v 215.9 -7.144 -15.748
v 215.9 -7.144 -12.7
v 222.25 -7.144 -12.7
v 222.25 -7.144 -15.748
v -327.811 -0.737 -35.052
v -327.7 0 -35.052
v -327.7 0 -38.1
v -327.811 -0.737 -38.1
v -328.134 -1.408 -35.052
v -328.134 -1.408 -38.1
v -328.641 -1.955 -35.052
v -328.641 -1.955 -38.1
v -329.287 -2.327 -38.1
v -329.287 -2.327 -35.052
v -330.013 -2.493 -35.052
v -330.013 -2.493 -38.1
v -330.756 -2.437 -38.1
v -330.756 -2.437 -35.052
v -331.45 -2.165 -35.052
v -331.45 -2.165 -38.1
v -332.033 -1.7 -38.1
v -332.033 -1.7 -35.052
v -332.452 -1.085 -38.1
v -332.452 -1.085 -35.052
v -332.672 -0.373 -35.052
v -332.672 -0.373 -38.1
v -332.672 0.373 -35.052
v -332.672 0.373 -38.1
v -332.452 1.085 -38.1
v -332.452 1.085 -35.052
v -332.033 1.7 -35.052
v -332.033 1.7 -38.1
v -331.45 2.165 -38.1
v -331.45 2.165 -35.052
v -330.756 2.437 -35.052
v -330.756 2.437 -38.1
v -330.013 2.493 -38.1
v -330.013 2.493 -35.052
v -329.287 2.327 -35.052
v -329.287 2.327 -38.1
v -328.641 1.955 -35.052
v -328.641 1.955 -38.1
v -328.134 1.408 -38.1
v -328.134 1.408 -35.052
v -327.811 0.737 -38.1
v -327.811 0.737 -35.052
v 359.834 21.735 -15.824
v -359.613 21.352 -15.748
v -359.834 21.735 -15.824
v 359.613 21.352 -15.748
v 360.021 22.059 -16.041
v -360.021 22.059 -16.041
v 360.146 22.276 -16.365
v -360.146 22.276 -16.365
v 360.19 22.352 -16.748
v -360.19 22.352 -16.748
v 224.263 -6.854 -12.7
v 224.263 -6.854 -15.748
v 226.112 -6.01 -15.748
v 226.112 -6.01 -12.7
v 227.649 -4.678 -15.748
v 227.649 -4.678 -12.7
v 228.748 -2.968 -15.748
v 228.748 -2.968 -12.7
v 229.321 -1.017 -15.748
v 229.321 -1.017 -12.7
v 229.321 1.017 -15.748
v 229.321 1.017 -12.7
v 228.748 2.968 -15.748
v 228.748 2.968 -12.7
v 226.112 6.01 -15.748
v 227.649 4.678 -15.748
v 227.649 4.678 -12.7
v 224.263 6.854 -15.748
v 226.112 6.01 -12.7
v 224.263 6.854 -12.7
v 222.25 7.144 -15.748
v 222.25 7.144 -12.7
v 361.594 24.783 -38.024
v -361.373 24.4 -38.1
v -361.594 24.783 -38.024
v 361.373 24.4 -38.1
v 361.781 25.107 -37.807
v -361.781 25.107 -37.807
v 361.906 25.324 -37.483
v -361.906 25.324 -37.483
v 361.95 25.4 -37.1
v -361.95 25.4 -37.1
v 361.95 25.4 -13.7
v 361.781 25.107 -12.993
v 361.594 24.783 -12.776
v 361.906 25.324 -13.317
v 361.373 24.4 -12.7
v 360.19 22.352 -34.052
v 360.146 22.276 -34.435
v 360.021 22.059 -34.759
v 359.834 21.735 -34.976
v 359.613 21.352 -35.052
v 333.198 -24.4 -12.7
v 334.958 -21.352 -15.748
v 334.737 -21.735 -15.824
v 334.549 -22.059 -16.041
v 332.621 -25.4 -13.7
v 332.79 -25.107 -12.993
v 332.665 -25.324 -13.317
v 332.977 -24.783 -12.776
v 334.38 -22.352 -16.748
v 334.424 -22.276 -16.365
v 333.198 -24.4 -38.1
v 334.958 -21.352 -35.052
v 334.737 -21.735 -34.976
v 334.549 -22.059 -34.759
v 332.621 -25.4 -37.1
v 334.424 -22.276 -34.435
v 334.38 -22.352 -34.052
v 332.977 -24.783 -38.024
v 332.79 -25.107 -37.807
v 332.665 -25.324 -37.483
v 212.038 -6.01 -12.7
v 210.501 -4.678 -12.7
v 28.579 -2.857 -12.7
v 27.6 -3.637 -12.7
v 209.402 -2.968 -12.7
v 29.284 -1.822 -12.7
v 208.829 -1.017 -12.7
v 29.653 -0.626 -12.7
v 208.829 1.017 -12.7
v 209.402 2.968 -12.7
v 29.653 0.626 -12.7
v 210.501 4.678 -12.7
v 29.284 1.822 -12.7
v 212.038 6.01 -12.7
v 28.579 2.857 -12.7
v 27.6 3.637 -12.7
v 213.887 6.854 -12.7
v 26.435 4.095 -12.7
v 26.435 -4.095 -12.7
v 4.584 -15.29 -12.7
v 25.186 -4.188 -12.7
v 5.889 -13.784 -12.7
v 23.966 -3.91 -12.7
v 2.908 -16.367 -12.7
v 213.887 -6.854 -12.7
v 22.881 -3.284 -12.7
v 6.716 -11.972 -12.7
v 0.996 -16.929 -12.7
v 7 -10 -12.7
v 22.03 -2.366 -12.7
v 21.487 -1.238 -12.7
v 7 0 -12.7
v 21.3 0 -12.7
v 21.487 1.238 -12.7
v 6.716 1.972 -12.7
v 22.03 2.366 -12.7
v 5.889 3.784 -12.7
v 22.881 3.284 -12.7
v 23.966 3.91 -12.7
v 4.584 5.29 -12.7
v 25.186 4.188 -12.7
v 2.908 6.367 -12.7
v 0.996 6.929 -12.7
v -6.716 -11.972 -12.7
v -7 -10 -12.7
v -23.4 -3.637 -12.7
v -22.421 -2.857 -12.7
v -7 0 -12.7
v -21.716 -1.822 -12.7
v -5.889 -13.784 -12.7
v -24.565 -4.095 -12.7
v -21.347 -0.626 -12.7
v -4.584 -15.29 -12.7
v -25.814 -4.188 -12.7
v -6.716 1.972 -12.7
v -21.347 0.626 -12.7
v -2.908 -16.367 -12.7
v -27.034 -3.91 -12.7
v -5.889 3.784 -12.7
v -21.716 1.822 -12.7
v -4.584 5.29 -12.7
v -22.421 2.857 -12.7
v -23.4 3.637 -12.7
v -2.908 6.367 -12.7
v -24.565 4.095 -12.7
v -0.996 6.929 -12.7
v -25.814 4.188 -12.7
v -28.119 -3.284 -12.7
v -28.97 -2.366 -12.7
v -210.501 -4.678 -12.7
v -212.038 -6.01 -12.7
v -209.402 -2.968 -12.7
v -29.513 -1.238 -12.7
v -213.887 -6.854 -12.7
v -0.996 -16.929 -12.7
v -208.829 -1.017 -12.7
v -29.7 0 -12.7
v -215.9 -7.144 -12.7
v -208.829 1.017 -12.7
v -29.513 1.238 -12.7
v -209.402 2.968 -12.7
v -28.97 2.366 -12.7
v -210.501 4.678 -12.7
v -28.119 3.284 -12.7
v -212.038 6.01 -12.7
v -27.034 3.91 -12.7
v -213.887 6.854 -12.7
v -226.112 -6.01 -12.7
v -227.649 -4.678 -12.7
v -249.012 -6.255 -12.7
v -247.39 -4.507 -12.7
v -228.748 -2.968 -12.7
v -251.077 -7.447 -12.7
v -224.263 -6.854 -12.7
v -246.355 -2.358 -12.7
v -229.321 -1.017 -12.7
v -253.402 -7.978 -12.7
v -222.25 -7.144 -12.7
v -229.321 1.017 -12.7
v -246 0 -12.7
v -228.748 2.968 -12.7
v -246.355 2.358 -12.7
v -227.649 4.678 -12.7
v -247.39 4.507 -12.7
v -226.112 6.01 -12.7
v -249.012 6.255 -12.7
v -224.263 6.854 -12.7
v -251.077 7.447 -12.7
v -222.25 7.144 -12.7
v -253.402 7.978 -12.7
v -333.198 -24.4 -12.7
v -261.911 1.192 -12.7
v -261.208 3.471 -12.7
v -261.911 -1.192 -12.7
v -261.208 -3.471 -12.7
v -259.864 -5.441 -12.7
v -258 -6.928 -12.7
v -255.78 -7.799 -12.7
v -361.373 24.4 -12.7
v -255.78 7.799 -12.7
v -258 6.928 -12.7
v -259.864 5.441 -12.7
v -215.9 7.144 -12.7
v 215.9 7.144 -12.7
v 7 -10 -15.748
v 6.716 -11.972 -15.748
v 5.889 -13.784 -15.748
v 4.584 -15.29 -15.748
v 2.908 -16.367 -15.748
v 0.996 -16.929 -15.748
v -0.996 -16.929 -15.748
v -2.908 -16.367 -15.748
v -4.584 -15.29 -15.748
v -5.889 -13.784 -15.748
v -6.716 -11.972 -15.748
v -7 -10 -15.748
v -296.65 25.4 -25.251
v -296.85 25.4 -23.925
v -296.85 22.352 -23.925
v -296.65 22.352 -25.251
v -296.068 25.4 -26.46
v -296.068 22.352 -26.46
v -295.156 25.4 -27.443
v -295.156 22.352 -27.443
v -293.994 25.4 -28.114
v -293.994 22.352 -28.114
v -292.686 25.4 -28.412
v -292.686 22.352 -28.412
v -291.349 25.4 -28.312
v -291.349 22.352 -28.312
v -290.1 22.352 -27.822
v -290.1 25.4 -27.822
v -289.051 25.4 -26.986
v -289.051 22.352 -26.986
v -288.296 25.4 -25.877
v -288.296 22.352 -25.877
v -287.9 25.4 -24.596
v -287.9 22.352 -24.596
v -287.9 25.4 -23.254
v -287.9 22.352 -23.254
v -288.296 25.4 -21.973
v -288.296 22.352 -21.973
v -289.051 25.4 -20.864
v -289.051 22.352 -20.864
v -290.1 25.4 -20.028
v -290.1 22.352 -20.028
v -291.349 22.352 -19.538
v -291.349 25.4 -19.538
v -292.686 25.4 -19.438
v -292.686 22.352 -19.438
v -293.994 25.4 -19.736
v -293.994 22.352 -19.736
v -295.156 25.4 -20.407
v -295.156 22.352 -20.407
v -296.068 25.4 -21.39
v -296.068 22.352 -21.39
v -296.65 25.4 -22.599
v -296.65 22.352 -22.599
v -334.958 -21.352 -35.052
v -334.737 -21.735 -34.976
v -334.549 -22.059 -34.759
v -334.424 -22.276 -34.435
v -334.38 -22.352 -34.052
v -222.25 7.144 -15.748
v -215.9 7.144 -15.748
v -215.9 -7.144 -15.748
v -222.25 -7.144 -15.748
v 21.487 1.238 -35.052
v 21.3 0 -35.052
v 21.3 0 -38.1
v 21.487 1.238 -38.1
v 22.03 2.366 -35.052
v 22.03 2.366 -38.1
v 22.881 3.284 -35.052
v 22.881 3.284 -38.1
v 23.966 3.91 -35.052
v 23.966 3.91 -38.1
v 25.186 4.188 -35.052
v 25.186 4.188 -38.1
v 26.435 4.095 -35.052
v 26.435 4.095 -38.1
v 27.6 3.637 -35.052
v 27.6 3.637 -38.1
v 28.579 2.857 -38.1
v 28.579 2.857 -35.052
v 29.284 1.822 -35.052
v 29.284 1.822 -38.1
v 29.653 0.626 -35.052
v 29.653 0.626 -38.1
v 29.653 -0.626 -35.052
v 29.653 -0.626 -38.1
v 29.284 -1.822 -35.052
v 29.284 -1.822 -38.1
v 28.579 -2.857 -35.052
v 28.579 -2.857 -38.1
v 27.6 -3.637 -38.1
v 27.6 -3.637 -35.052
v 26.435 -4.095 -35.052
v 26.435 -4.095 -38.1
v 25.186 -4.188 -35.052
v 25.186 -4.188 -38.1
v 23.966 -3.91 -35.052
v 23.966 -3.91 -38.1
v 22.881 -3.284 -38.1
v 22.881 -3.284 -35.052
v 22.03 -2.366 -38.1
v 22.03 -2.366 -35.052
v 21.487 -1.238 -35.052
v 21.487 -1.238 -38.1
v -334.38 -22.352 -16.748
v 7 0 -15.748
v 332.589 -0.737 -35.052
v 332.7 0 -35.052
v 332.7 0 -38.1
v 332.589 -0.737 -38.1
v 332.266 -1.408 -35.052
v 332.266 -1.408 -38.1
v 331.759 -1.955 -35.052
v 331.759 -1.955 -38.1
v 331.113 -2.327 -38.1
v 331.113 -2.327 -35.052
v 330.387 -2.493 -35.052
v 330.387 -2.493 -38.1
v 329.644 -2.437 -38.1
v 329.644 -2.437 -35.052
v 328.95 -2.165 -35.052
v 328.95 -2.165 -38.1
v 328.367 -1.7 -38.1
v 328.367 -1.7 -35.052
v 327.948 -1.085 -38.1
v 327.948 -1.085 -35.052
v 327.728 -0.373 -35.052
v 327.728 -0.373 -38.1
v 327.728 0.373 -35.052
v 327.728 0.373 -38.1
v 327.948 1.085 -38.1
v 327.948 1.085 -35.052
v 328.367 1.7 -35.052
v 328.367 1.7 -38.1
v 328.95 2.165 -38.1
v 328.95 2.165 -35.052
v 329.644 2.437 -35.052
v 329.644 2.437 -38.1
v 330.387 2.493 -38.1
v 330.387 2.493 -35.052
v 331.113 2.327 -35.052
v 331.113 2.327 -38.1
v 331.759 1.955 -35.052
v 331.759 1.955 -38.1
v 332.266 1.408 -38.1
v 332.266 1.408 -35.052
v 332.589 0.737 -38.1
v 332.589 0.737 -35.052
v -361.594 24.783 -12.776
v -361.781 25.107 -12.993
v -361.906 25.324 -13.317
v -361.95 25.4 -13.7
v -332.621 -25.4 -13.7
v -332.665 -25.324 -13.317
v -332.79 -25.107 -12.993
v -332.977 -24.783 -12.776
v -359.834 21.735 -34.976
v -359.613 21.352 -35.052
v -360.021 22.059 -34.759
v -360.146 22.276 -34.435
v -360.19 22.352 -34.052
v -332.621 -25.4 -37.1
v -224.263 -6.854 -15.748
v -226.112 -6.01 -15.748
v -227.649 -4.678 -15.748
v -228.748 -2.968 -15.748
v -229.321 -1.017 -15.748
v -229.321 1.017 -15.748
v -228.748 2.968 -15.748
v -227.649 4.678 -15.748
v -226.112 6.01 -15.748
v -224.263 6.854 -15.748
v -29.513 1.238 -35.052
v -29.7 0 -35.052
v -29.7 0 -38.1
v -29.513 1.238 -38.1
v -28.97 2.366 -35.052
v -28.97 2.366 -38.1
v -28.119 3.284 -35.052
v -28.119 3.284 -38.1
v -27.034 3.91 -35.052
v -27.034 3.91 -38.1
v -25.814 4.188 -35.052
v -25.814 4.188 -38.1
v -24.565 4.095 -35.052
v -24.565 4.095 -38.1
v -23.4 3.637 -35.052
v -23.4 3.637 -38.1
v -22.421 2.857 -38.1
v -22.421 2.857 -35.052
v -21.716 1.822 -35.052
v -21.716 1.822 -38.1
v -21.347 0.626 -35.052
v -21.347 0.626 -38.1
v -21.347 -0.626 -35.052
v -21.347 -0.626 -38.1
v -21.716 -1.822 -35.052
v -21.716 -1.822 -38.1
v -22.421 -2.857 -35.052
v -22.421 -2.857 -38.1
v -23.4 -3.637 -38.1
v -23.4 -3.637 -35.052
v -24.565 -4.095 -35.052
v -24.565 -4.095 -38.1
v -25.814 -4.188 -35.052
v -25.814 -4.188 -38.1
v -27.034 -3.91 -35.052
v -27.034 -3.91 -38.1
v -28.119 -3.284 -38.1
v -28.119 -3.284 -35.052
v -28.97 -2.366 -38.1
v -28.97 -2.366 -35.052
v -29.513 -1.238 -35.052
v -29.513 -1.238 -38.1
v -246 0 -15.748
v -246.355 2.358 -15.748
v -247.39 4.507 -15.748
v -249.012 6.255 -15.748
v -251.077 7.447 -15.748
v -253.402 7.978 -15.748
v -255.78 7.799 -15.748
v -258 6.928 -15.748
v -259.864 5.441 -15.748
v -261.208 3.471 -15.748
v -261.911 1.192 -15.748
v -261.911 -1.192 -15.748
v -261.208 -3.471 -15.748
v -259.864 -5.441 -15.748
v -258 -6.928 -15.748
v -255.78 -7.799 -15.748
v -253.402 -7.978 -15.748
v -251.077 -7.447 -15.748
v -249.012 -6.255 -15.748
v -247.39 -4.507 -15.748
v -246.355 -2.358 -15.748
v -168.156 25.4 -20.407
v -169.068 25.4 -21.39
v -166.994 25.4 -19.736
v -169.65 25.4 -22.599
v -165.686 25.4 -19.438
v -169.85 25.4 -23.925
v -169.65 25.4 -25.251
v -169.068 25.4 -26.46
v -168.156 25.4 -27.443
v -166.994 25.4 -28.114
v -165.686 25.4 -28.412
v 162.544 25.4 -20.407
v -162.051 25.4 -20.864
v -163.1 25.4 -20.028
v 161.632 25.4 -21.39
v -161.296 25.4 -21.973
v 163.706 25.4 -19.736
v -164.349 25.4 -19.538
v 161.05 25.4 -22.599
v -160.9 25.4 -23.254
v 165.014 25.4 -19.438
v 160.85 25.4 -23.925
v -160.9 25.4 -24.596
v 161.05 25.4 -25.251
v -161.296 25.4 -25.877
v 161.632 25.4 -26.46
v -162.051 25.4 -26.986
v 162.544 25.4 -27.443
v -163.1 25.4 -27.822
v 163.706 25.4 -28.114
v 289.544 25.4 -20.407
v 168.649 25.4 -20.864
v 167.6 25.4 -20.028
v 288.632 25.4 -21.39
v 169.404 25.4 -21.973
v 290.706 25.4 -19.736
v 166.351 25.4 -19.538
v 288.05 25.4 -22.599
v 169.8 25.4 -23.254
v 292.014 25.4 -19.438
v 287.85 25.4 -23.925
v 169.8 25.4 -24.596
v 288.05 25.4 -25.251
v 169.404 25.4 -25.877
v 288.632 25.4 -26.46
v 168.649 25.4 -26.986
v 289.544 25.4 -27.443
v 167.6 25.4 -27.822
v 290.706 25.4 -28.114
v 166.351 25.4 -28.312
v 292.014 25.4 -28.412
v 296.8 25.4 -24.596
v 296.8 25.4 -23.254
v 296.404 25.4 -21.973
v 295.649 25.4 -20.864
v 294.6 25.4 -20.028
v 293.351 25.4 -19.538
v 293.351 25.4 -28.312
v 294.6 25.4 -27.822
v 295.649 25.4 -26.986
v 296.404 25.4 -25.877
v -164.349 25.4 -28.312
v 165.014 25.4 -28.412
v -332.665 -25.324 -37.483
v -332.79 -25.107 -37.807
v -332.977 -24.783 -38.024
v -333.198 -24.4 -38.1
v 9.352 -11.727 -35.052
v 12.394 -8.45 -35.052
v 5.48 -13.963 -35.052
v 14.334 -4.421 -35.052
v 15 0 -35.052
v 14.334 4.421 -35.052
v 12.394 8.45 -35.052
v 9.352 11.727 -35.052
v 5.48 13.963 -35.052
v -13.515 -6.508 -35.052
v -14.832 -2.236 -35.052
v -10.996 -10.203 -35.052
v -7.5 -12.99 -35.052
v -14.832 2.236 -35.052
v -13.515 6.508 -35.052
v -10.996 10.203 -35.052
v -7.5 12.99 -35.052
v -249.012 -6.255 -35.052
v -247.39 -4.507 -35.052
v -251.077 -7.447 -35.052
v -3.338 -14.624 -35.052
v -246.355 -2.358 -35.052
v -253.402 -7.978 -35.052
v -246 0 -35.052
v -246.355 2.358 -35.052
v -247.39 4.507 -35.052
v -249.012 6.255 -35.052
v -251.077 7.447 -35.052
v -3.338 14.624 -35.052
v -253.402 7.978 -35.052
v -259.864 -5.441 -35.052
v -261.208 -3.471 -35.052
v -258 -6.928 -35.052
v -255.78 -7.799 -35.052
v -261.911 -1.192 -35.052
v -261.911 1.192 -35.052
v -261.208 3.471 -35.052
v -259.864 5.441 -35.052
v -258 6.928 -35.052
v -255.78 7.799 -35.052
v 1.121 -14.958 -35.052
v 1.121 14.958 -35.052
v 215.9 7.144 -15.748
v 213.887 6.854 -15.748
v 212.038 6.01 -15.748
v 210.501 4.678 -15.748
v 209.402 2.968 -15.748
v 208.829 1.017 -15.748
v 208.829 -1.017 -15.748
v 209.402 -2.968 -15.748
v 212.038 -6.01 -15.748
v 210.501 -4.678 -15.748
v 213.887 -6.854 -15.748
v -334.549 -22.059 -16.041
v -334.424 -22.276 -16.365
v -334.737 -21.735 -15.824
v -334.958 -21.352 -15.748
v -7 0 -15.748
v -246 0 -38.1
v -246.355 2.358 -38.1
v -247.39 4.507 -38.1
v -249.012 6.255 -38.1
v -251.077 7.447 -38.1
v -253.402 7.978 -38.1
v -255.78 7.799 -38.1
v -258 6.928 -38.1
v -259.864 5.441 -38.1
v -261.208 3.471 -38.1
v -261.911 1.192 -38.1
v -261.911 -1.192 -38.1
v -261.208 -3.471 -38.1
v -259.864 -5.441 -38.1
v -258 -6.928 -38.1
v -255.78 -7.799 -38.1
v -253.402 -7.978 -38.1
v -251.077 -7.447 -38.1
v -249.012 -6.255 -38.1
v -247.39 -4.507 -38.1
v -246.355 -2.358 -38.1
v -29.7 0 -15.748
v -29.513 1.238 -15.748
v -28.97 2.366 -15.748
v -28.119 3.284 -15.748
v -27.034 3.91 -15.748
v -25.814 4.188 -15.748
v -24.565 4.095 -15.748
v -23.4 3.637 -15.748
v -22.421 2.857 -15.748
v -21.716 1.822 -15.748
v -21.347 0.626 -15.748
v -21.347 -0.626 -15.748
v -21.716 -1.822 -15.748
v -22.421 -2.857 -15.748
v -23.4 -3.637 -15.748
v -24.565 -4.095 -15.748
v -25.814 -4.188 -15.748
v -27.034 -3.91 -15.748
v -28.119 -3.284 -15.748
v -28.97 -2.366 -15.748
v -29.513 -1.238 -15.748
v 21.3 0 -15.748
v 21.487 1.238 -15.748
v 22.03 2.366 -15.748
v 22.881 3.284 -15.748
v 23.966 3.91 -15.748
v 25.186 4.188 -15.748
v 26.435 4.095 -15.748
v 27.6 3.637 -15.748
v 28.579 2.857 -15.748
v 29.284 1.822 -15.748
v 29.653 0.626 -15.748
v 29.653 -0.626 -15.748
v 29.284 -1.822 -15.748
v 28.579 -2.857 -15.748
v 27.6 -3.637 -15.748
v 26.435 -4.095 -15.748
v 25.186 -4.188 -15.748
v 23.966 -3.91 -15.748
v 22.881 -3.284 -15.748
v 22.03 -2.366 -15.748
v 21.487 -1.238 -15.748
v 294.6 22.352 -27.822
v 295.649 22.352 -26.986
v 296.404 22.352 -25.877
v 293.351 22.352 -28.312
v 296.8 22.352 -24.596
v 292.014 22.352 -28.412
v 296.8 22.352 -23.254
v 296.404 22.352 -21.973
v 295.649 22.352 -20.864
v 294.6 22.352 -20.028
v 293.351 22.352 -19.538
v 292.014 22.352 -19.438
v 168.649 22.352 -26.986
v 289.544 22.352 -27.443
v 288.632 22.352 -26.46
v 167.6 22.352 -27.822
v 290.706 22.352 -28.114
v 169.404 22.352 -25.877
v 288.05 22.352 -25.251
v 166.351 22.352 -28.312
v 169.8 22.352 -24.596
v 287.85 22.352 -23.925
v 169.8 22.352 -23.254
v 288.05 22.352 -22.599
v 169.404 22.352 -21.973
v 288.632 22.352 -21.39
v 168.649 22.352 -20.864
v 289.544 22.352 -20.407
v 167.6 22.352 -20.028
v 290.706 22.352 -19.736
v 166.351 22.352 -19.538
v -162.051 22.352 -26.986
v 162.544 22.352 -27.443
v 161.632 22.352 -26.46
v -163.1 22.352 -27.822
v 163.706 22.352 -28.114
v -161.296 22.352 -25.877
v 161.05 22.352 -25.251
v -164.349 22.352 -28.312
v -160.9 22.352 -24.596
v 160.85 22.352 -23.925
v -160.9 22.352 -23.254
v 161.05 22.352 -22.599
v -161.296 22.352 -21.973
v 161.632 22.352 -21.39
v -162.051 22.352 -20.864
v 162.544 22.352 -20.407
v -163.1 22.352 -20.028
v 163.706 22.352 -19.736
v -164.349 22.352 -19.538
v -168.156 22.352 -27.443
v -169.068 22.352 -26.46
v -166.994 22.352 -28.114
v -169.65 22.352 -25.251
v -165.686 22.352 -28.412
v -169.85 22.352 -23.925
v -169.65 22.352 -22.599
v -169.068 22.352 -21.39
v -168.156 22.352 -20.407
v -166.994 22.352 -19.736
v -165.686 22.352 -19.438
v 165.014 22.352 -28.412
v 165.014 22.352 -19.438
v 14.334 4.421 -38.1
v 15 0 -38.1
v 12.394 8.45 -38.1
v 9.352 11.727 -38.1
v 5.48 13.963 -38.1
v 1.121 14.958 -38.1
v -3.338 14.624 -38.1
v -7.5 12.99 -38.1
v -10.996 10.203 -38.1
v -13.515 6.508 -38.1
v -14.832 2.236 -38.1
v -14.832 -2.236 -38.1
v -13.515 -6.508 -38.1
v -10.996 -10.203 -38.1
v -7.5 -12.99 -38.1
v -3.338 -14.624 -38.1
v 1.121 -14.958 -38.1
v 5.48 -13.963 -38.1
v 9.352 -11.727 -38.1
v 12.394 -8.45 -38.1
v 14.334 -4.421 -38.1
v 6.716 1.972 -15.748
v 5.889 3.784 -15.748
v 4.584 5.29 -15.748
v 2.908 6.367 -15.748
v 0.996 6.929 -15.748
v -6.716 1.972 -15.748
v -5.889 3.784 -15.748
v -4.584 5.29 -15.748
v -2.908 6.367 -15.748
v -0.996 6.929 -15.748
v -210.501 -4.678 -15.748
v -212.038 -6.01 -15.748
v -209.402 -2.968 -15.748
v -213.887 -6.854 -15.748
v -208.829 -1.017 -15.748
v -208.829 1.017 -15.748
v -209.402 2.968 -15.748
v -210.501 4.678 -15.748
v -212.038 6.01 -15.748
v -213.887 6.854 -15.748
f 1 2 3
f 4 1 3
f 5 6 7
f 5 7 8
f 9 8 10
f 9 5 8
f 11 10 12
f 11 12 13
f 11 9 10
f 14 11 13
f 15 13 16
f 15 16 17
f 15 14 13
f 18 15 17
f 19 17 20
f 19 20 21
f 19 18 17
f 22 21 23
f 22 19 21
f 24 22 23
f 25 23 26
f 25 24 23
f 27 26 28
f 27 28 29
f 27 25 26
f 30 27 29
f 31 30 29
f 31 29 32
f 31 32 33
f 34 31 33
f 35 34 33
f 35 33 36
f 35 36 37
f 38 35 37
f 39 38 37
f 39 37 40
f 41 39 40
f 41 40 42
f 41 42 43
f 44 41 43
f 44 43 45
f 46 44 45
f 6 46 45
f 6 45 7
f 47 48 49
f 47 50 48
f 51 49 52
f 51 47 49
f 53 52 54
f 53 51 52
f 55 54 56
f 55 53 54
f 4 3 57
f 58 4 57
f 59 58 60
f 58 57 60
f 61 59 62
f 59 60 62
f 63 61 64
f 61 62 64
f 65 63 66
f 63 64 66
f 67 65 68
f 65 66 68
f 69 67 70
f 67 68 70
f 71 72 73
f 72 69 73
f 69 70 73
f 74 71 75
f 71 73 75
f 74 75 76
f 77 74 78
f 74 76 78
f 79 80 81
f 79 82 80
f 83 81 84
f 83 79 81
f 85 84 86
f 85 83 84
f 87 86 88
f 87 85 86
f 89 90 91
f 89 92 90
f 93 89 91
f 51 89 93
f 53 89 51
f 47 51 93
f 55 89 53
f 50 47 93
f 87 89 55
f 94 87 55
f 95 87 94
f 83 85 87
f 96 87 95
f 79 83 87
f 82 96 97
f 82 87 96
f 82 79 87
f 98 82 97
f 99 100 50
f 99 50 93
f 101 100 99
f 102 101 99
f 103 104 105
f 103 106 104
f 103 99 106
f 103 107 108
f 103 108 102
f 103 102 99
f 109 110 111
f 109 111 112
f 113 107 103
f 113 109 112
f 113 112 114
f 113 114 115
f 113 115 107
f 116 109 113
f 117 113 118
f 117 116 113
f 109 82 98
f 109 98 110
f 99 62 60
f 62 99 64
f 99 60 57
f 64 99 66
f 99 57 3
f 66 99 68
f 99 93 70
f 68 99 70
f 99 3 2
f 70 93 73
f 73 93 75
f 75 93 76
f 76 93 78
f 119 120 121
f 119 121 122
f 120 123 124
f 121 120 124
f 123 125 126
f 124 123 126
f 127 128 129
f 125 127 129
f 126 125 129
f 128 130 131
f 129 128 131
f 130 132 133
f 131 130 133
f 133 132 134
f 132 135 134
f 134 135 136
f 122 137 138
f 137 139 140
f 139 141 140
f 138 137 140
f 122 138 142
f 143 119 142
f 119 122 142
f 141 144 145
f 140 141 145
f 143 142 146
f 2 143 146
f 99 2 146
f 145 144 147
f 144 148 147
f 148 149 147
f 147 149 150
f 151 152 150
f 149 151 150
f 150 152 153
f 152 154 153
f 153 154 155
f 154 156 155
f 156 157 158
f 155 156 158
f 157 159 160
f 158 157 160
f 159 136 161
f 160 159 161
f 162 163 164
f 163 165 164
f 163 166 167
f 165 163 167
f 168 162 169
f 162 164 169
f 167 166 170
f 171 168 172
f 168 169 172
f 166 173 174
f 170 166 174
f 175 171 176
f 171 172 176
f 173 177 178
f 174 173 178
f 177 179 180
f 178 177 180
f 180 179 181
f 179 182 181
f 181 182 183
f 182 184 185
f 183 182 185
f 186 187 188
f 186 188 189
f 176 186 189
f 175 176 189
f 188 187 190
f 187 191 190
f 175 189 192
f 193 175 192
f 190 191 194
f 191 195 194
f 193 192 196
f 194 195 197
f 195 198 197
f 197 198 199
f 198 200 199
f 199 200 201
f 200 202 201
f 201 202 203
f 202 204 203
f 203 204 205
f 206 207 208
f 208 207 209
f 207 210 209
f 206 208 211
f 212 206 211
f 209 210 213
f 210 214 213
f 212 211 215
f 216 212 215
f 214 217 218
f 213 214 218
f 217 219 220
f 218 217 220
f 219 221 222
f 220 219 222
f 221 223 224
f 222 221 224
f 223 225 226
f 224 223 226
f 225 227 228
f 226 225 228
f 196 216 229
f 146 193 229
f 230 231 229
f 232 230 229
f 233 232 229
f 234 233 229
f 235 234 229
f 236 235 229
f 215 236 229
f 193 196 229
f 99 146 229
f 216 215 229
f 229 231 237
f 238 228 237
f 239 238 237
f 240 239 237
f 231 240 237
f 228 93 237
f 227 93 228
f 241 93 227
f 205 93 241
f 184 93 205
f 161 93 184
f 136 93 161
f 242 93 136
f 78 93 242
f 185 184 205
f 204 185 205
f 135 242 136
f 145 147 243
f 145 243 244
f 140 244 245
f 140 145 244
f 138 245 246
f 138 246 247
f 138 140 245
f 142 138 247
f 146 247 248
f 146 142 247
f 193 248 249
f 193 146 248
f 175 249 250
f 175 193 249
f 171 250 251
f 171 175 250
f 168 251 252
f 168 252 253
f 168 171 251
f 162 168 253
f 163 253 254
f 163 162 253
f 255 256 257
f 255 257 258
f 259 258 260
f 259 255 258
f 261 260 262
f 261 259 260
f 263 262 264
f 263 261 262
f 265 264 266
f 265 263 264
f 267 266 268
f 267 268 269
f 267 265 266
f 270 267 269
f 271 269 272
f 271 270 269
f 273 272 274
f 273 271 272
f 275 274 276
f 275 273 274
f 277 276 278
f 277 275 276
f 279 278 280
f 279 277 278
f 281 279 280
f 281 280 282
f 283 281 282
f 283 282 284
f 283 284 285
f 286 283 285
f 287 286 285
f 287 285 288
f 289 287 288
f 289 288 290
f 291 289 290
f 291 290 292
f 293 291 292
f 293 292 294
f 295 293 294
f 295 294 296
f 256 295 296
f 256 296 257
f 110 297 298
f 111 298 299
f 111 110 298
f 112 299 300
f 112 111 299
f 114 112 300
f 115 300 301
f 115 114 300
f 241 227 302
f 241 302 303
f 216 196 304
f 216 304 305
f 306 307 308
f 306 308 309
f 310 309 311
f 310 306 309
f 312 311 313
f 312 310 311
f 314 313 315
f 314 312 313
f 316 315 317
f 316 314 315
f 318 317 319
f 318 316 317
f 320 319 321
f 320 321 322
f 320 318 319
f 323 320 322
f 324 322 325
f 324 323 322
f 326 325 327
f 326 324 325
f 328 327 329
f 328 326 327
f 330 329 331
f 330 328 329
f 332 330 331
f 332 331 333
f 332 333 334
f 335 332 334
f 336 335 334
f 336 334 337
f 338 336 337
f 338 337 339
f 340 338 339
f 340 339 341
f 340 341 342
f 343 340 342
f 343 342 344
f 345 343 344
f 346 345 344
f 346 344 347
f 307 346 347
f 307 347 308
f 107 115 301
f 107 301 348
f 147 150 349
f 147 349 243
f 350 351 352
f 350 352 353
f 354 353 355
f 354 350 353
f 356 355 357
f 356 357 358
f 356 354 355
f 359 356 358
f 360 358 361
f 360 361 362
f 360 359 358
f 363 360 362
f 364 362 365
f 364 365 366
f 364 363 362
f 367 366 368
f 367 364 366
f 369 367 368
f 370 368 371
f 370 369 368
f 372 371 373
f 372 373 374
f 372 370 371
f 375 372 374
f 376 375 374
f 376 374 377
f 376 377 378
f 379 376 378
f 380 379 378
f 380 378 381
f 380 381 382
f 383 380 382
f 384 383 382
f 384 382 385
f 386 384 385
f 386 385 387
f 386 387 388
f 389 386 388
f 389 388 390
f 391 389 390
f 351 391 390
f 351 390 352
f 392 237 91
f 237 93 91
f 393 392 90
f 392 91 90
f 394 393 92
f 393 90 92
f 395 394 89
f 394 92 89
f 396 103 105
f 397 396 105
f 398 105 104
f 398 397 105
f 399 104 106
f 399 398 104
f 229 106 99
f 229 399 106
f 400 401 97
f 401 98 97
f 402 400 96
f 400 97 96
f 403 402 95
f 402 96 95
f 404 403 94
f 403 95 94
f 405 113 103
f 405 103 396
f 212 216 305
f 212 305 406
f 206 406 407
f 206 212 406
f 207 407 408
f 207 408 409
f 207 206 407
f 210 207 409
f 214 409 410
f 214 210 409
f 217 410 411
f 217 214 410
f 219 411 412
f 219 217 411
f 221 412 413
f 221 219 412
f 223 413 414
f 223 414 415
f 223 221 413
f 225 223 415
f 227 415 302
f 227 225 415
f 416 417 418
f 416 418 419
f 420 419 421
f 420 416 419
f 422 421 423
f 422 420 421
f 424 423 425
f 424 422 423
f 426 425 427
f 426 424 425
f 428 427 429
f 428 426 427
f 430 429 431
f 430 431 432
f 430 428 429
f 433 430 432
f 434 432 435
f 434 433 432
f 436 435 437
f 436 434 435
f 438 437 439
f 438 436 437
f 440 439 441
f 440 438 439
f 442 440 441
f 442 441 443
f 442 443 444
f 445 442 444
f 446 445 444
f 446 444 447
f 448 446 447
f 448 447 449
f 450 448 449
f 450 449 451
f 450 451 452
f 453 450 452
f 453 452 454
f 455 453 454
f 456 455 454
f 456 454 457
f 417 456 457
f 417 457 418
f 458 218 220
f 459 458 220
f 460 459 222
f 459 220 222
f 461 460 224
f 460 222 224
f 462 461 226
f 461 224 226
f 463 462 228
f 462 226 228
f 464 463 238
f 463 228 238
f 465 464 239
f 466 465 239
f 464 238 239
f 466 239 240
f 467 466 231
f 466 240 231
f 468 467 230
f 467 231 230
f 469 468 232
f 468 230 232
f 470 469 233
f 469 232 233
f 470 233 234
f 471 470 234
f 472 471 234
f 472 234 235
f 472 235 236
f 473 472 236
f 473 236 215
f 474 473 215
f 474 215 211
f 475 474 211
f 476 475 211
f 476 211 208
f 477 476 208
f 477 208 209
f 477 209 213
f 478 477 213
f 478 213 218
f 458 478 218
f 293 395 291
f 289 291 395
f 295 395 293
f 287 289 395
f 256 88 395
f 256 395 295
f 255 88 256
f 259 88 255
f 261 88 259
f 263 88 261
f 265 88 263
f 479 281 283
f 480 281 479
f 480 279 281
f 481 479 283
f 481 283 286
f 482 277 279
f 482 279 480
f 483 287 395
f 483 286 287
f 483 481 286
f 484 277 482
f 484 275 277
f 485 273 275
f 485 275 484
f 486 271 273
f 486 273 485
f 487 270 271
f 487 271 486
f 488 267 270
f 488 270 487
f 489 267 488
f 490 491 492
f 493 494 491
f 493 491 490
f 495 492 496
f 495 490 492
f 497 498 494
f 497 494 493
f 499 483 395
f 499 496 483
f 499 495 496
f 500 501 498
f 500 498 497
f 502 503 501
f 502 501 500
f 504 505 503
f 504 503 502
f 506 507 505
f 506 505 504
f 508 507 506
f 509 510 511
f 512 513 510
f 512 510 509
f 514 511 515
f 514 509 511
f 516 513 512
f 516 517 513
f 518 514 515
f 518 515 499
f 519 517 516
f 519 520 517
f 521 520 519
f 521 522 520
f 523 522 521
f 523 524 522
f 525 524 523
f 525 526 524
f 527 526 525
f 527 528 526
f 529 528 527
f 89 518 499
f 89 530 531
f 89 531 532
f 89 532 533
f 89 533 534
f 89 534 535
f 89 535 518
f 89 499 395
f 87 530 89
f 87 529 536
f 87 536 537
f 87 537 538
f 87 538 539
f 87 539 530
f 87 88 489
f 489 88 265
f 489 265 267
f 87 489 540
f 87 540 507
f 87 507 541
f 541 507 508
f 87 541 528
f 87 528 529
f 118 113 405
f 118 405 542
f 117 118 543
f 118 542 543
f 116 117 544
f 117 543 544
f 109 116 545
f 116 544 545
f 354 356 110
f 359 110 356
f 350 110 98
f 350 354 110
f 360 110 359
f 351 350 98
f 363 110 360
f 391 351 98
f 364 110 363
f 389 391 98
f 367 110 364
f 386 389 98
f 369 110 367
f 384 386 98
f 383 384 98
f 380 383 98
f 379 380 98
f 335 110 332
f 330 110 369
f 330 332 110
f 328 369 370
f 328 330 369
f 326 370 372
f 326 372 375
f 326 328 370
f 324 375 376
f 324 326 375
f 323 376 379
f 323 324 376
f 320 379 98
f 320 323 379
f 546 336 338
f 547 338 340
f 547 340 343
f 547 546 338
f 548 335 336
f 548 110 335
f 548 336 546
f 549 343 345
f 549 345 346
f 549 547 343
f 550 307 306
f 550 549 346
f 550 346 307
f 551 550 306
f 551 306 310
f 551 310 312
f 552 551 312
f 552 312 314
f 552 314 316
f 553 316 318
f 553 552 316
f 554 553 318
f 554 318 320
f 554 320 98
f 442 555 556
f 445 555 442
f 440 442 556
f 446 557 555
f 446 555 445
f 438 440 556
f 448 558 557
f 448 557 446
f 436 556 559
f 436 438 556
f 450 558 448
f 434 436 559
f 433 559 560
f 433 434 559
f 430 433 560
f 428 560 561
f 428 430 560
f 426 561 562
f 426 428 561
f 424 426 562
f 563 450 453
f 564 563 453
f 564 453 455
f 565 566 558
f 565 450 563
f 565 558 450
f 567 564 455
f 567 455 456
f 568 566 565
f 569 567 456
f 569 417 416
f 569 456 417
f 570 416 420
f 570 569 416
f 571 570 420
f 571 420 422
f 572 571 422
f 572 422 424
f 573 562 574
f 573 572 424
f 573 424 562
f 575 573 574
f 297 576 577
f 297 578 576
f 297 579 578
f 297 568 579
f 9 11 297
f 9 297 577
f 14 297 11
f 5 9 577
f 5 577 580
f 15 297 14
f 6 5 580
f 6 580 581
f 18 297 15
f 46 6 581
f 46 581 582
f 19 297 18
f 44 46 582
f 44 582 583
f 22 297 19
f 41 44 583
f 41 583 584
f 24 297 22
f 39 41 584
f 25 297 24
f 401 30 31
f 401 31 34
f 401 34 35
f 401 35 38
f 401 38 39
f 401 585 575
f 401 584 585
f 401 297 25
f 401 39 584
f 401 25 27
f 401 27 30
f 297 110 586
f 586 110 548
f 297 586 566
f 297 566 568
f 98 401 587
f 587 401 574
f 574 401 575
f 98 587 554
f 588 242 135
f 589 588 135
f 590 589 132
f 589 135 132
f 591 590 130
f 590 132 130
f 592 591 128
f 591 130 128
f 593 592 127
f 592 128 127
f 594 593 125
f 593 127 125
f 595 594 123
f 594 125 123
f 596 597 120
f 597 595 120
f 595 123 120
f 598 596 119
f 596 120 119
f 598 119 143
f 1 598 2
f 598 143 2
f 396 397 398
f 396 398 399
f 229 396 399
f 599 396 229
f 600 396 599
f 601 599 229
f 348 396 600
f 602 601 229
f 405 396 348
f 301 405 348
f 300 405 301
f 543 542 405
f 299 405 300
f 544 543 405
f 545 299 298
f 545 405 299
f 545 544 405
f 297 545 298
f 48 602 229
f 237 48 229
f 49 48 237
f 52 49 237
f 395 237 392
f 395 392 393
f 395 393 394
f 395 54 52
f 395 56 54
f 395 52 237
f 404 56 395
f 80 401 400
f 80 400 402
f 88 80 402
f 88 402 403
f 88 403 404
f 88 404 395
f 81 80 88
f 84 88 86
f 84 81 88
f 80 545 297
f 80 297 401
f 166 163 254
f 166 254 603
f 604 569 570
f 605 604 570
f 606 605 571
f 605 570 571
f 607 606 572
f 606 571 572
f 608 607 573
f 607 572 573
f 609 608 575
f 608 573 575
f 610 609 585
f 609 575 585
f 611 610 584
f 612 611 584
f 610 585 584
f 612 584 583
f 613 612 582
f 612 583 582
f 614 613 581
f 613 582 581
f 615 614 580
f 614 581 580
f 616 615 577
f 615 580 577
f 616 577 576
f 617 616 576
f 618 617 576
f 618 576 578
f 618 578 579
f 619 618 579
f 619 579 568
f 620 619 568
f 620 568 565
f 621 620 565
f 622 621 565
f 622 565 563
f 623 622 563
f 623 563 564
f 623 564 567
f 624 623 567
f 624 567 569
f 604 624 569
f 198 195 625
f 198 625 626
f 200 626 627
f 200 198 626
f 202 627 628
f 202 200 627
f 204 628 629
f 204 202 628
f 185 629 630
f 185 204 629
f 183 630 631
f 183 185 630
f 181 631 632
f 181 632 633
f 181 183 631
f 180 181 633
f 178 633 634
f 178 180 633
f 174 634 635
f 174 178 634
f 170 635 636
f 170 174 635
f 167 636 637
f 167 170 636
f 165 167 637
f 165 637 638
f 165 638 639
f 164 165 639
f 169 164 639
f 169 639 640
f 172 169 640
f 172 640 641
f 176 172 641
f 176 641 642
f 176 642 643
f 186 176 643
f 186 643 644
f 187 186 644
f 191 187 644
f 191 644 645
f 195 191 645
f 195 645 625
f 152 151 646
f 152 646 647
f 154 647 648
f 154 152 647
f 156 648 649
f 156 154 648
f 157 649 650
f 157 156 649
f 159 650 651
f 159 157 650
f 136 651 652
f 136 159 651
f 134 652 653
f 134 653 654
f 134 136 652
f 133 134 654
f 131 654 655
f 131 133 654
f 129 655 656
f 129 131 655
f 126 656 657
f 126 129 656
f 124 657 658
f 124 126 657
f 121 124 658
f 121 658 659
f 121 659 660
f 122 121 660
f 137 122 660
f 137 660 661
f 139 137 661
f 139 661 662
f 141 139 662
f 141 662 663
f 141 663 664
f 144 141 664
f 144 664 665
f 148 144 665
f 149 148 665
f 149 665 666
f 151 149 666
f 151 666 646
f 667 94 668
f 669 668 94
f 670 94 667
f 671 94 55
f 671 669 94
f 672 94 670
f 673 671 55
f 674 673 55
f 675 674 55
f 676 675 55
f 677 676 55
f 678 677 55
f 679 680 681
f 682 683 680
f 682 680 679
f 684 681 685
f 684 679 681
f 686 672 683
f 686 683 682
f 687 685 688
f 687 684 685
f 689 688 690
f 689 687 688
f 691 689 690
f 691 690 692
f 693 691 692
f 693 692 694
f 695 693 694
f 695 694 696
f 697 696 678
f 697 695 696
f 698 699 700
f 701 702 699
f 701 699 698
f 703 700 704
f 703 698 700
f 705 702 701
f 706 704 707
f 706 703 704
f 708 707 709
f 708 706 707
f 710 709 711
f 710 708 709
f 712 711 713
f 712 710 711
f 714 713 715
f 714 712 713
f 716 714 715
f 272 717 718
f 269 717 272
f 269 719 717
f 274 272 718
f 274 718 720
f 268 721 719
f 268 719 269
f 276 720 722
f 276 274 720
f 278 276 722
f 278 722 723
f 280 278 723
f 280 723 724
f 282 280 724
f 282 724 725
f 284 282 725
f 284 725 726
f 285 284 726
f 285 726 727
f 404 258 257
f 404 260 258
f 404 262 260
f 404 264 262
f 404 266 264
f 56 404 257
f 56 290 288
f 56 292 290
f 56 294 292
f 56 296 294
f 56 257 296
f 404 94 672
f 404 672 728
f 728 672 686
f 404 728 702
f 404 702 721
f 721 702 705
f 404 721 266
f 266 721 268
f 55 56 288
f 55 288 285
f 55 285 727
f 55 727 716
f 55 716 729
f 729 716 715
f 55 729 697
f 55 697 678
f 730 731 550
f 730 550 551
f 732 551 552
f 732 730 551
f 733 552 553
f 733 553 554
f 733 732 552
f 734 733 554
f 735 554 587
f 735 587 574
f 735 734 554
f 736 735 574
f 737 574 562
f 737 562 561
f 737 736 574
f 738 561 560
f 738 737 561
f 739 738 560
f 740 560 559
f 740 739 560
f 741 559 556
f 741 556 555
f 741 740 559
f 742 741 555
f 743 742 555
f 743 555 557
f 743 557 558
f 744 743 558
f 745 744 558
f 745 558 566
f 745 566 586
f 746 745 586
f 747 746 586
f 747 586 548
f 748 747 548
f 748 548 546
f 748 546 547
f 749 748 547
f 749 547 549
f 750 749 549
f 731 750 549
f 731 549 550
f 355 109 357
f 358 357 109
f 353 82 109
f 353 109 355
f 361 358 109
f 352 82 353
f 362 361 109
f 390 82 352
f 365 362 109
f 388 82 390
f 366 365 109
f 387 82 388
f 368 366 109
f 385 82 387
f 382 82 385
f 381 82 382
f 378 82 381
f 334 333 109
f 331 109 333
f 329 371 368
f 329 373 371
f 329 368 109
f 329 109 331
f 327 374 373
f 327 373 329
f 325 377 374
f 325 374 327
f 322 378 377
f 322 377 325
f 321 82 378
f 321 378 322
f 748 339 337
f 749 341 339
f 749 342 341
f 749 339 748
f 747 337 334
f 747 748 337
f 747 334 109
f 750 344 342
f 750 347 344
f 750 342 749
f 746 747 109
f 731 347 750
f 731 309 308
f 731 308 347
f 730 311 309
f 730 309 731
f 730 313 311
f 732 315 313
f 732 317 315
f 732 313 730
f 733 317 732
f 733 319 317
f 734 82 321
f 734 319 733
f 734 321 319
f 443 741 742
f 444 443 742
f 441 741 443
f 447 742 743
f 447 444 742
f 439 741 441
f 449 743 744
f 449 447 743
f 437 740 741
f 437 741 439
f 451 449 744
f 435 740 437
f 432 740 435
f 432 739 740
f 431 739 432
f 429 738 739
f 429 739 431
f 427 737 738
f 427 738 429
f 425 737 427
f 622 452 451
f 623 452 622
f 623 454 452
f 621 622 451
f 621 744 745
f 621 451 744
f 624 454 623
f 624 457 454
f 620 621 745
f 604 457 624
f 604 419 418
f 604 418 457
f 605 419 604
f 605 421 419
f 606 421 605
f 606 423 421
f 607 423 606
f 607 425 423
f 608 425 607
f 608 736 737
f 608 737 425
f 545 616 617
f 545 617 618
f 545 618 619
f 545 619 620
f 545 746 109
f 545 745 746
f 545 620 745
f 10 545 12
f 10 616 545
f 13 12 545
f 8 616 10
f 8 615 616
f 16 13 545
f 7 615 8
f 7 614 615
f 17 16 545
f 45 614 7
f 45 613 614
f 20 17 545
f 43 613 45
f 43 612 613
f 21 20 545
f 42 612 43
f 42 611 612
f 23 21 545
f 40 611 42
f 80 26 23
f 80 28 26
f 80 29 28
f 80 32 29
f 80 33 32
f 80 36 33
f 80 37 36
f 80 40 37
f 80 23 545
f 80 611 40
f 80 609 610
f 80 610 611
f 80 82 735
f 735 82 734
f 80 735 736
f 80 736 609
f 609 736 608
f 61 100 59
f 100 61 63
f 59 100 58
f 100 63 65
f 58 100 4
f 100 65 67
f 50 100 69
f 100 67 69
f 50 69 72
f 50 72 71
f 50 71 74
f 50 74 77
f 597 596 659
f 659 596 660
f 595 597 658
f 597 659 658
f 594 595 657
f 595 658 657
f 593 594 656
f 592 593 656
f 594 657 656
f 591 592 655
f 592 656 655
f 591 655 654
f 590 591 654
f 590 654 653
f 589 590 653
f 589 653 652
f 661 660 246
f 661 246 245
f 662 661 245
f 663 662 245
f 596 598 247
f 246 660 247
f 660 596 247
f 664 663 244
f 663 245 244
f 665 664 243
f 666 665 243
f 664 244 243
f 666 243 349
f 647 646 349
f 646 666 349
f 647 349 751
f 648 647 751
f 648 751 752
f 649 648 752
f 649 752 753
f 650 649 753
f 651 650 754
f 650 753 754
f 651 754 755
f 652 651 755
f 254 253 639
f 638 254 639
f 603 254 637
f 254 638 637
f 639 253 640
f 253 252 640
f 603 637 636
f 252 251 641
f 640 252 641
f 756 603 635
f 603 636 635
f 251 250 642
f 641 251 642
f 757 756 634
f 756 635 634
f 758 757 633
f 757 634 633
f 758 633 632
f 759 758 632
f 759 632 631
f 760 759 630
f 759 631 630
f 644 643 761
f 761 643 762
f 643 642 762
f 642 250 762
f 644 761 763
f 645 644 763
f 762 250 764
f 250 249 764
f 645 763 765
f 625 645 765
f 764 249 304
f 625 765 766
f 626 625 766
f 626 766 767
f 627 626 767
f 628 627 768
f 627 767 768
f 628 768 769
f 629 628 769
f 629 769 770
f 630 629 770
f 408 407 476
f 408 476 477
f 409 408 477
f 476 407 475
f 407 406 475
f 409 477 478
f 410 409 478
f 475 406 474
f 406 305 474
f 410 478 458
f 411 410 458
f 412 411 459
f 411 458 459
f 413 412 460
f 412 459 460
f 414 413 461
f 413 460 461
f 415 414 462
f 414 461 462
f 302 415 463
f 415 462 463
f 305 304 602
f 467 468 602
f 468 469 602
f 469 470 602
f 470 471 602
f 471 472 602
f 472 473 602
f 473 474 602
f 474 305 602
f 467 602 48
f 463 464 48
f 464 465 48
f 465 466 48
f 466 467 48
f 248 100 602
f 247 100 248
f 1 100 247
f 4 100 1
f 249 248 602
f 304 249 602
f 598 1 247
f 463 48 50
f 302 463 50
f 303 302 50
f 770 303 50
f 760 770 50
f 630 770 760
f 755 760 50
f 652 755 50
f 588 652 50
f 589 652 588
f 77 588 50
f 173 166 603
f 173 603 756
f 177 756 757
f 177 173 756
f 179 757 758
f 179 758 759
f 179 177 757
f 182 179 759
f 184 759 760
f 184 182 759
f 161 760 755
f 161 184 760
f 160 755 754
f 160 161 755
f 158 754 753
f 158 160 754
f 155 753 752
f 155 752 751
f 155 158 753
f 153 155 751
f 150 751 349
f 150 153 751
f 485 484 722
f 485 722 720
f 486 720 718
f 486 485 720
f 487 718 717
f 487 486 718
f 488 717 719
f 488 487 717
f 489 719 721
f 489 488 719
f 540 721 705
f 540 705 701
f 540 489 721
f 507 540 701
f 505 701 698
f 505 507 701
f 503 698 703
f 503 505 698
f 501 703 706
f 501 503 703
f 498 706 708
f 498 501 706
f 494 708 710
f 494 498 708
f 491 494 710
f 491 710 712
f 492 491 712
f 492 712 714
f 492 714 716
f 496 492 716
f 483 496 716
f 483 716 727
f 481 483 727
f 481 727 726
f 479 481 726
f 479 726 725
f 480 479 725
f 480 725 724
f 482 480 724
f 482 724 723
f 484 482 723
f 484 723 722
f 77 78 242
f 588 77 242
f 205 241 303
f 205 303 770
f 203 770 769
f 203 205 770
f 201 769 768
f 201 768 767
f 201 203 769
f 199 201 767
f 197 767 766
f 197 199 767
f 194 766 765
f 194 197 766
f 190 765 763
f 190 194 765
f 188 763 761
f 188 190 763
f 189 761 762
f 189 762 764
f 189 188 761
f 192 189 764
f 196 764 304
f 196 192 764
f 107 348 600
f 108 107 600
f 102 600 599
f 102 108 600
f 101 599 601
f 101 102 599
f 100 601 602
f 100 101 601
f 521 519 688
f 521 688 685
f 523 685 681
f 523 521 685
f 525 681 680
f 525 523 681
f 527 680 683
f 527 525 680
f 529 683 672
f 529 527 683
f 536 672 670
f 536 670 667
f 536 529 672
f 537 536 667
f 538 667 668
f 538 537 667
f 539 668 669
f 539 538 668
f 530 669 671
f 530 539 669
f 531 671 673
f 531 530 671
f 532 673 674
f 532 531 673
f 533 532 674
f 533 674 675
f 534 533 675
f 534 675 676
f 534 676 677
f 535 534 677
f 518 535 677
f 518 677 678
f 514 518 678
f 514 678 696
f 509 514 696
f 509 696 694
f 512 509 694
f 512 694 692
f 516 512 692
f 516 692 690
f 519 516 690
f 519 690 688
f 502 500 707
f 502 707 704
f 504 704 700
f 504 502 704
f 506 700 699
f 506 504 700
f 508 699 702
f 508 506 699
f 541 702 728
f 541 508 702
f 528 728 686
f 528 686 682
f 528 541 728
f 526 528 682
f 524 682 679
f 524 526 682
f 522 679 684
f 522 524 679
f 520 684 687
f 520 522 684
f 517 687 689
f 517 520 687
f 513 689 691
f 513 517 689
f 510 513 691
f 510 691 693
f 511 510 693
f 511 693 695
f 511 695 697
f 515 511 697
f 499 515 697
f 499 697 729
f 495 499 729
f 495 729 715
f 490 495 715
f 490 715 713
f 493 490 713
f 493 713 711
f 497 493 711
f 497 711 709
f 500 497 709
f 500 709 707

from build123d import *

# Parameters (mm, degrees)
BOSS_EXTRUDE1_DEPTH       = 12.7
CUT_EXTRUDE1_DEPTH        = 364.062325917
CUT_EXTRUDE1_DEPTH_BACK   = 364.062325917
SKETCH3_W                 = 19.304
SKETCH3_H                 = 44.704
FILLET1_R                 = 1
WIREHOLE_REACH            = 365.728
MIDDLEHOLE_REACH          = 365.728
SKETCH5_R                 = 15
SPACERHOLESM8_D           = 8.4
WIRE_SLOTS_REACH          = 365.728
PLATE_MOUNTING_REACH      = 367.718
SKETCH14_R                = 4.5
M6X1_0_TAPPED_HOLE1_D     = 5
M6X1_0_TAPPED_HOLE1_DEPTH = 5.588
CUT_EXTRUDE5_DEPTH        = 365.834993524
CUT_EXTRUDE5_DEPTH_BACK   = 365.834993524
SKETCH10_W                = 25.4
SKETCH10_H                = 50.8
POWER_D                   = 16


with BuildPart() as part:
    # Sketch2 → Boss-Extrude1 (new, symmetric)
    with BuildSketch(Plane.XY):
        Polygon((-332.620606325, -25.4), (-361.95, 25.4), (361.95, 25.4), (332.620606325, -25.4), align=None)
    extrude(amount=BOSS_EXTRUDE1_DEPTH, both=True)

    # Sketch3 → Cut-Extrude1 (cut, two sides: drawn at the far end of the back side and taken through both)
    with BuildSketch(Plane(origin=(0, 0, 0), x_dir=(0, 0, -1), z_dir=(1, 0, 0)).offset(-CUT_EXTRUDE1_DEPTH_BACK)):
        Rectangle(SKETCH3_W, SKETCH3_H)
    extrude(amount=CUT_EXTRUDE1_DEPTH + CUT_EXTRUDE1_DEPTH_BACK, mode=Mode.SUBTRACT)

    # Fillet1
    fillet1_edges = [part.edges().sort_by_distance(p)[0] for p in [
        (0, -25.4, 12.7),
        (0, 22.352, -9.652),
        (0, -22.352, -9.652),
        (0, -22.352, 9.652),
        (0, 22.352, 9.652),
        (0, -25.4, -12.7),
        (0, 25.4, -12.7),
        (0, 25.4, 12.7),
    ]]
    fillet(fillet1_edges, radius=FILLET1_R)

    # Sketch4 → WireHole (cut, up to next)
    with BuildSketch(Plane(origin=(0, 0, -12.7), x_dir=(-1, 0, 0), z_dir=(0, 0, -1)), mode=Mode.PRIVATE) as wirehole_sk1:
        with BuildLine():
            Line((-7, 0), (-7, -10))
            ThreePointArc((-7, -10), (0, -17), (7, -10))
            Line((7, -10), (7, 0))
            ThreePointArc((7, 0), (0, 7), (-7, 0))
        make_face()
    wirehole_tool1 = extrude(wirehole_sk1.sketch, amount=-WIREHOLE_REACH, mode=Mode.PRIVATE) & part.part
    add(wirehole_tool1.solids().sort_by_distance((0, -5, -12.7))[0], mode=Mode.SUBTRACT)

    # Sketch5 → MiddleHole (cut, up to next)
    with BuildSketch(Plane.XY.offset(12.7), mode=Mode.PRIVATE) as middlehole_sk1:
        Circle(SKETCH5_R)
    middlehole_tool1 = extrude(middlehole_sk1.sketch, amount=-MIDDLEHOLE_REACH, mode=Mode.PRIVATE) & part.part
    add(middlehole_tool1.solids().sort_by_distance((0, 0, 12.7))[0], mode=Mode.SUBTRACT)

    # SpacerHolesM8 (through all)
    with Locations(Plane.XY.offset(12.7)):
        with Locations((-25.5, 0), (25.5, 0)):
            Hole(SPACERHOLESM8_D / 2)

    # Sketch9 → Wire Slots (cut, up to next)
    with BuildSketch(Plane(origin=(0, 0, -12.7), x_dir=(-1, 0, 0), z_dir=(0, 0, -1)), mode=Mode.PRIVATE) as wire_slots_sk1:
        with BuildLine():
            Line((-222.25, 7.14375), (-215.9, 7.14375))
            ThreePointArc((-215.9, 7.14375), (-208.75625, 0), (-215.9, -7.14375))
            Line((-215.9, -7.14375), (-222.25, -7.14375))
            ThreePointArc((-222.25, -7.14375), (-229.39375, 0), (-222.25, 7.14375))
        make_face()
    wire_slots_tool1 = extrude(wire_slots_sk1.sketch, amount=-WIRE_SLOTS_REACH, mode=Mode.PRIVATE) & part.part
    # Sketch9 → Wire Slots (cut, up to next)
    with BuildSketch(Plane(origin=(0, 0, -12.7), x_dir=(-1, 0, 0), z_dir=(0, 0, -1)), mode=Mode.PRIVATE) as wire_slots_sk2:
        with BuildLine():
            Line((222.25, 7.14375), (215.9, 7.14375))
            ThreePointArc((215.9, 7.14375), (208.75625, 0), (215.9, -7.14375))
            Line((215.9, -7.14375), (222.25, -7.14375))
            ThreePointArc((222.25, -7.14375), (229.39375, 0), (222.25, 7.14375))
        make_face()
    wire_slots_tool2 = extrude(wire_slots_sk2.sketch, amount=-WIRE_SLOTS_REACH, mode=Mode.PRIVATE) & part.part
    add(wire_slots_tool1.solids().sort_by_distance((219.075, 0, -12.7))[0], mode=Mode.SUBTRACT)
    add(wire_slots_tool2.solids().sort_by_distance((-219.075, 0, -12.7))[0], mode=Mode.SUBTRACT)

    # Sketch14 → Plate Mounting (cut, up to next)
    with BuildSketch(Plane(origin=(0, 25.4, 0), x_dir=(1, 0, 0), z_dir=(0, 1, 0)), mode=Mode.PRIVATE) as plate_mounting_sk1:
        with Locations(Location((-165.35, 1.475, 0), (0, 0, 180))):
            Circle(SKETCH14_R)
    plate_mounting_tool1 = extrude(plate_mounting_sk1.sketch, amount=-PLATE_MOUNTING_REACH, mode=Mode.PRIVATE) & part.part
    # Sketch14 → Plate Mounting (cut, up to next)
    with BuildSketch(Plane(origin=(0, 25.4, 0), x_dir=(1, 0, 0), z_dir=(0, 1, 0)), mode=Mode.PRIVATE) as plate_mounting_sk2:
        with Locations(Location((-292.35, 1.475, 0), (0, 0, 180))):
            Circle(SKETCH14_R)
    plate_mounting_tool2 = extrude(plate_mounting_sk2.sketch, amount=-PLATE_MOUNTING_REACH, mode=Mode.PRIVATE) & part.part
    # Sketch14 → Plate Mounting (cut, up to next)
    with BuildSketch(Plane(origin=(0, 25.4, 0), x_dir=(1, 0, 0), z_dir=(0, 1, 0)), mode=Mode.PRIVATE) as plate_mounting_sk3:
        with Locations(Location((292.35, 1.475, 0), (0, 0, 180))):
            Circle(SKETCH14_R)
    plate_mounting_tool3 = extrude(plate_mounting_sk3.sketch, amount=-PLATE_MOUNTING_REACH, mode=Mode.PRIVATE) & part.part
    # Sketch14 → Plate Mounting (cut, up to next)
    with BuildSketch(Plane(origin=(0, 25.4, 0), x_dir=(1, 0, 0), z_dir=(0, 1, 0)), mode=Mode.PRIVATE) as plate_mounting_sk4:
        with Locations(Location((165.35, 1.475, 0), (0, 0, 180))):
            Circle(SKETCH14_R)
    plate_mounting_tool4 = extrude(plate_mounting_sk4.sketch, amount=-PLATE_MOUNTING_REACH, mode=Mode.PRIVATE) & part.part
    add(plate_mounting_tool1.solids().sort_by_distance((-165.35, 25.4, -1.475))[0], mode=Mode.SUBTRACT)
    add(plate_mounting_tool2.solids().sort_by_distance((-292.35, 25.4, -1.475))[0], mode=Mode.SUBTRACT)
    add(plate_mounting_tool3.solids().sort_by_distance((292.35, 25.4, -1.475))[0], mode=Mode.SUBTRACT)
    add(plate_mounting_tool4.solids().sort_by_distance((165.35, 25.4, -1.475))[0], mode=Mode.SUBTRACT)

    # M6x1.0 Tapped Hole1
    with Locations(Plane(origin=(0, 0, 15.24), x_dir=(-1, 0, 0), z_dir=(0, 0, 1))):
        with Locations((-330.2, 0), (330.2, 0)):
            Hole(M6X1_0_TAPPED_HOLE1_D / 2, depth=M6X1_0_TAPPED_HOLE1_DEPTH)


with BuildPart() as body_2:
    # Mirror1: mirrored copy
    add(part.part.mirror(Plane(origin=(0, 0, -12.7), x_dir=(1, 0, 0), z_dir=(0, 0, -1))))

    # Power (through all)
    with Locations(Plane(origin=(0, 0, -38.1), x_dir=(-1, 0, 0), z_dir=(0, 0, -1))):
        with Locations((254, 0)):
            Hole(POWER_D / 2)


with BuildPart() as part_1:
    add(part.part)

    # Sketch10 → Cut-Extrude5 (cut, two sides: drawn at the far end of the back side and taken through both)
    with BuildSketch(Plane(origin=(0, 0, 0), x_dir=(0, 0, -1), z_dir=(1, 0, 0)).offset(-CUT_EXTRUDE5_DEPTH_BACK)):
        Rectangle(SKETCH10_W, SKETCH10_H)
    extrude(amount=CUT_EXTRUDE5_DEPTH + CUT_EXTRUDE5_DEPTH_BACK, mode=Mode.SUBTRACT)


solid = body_2.part
